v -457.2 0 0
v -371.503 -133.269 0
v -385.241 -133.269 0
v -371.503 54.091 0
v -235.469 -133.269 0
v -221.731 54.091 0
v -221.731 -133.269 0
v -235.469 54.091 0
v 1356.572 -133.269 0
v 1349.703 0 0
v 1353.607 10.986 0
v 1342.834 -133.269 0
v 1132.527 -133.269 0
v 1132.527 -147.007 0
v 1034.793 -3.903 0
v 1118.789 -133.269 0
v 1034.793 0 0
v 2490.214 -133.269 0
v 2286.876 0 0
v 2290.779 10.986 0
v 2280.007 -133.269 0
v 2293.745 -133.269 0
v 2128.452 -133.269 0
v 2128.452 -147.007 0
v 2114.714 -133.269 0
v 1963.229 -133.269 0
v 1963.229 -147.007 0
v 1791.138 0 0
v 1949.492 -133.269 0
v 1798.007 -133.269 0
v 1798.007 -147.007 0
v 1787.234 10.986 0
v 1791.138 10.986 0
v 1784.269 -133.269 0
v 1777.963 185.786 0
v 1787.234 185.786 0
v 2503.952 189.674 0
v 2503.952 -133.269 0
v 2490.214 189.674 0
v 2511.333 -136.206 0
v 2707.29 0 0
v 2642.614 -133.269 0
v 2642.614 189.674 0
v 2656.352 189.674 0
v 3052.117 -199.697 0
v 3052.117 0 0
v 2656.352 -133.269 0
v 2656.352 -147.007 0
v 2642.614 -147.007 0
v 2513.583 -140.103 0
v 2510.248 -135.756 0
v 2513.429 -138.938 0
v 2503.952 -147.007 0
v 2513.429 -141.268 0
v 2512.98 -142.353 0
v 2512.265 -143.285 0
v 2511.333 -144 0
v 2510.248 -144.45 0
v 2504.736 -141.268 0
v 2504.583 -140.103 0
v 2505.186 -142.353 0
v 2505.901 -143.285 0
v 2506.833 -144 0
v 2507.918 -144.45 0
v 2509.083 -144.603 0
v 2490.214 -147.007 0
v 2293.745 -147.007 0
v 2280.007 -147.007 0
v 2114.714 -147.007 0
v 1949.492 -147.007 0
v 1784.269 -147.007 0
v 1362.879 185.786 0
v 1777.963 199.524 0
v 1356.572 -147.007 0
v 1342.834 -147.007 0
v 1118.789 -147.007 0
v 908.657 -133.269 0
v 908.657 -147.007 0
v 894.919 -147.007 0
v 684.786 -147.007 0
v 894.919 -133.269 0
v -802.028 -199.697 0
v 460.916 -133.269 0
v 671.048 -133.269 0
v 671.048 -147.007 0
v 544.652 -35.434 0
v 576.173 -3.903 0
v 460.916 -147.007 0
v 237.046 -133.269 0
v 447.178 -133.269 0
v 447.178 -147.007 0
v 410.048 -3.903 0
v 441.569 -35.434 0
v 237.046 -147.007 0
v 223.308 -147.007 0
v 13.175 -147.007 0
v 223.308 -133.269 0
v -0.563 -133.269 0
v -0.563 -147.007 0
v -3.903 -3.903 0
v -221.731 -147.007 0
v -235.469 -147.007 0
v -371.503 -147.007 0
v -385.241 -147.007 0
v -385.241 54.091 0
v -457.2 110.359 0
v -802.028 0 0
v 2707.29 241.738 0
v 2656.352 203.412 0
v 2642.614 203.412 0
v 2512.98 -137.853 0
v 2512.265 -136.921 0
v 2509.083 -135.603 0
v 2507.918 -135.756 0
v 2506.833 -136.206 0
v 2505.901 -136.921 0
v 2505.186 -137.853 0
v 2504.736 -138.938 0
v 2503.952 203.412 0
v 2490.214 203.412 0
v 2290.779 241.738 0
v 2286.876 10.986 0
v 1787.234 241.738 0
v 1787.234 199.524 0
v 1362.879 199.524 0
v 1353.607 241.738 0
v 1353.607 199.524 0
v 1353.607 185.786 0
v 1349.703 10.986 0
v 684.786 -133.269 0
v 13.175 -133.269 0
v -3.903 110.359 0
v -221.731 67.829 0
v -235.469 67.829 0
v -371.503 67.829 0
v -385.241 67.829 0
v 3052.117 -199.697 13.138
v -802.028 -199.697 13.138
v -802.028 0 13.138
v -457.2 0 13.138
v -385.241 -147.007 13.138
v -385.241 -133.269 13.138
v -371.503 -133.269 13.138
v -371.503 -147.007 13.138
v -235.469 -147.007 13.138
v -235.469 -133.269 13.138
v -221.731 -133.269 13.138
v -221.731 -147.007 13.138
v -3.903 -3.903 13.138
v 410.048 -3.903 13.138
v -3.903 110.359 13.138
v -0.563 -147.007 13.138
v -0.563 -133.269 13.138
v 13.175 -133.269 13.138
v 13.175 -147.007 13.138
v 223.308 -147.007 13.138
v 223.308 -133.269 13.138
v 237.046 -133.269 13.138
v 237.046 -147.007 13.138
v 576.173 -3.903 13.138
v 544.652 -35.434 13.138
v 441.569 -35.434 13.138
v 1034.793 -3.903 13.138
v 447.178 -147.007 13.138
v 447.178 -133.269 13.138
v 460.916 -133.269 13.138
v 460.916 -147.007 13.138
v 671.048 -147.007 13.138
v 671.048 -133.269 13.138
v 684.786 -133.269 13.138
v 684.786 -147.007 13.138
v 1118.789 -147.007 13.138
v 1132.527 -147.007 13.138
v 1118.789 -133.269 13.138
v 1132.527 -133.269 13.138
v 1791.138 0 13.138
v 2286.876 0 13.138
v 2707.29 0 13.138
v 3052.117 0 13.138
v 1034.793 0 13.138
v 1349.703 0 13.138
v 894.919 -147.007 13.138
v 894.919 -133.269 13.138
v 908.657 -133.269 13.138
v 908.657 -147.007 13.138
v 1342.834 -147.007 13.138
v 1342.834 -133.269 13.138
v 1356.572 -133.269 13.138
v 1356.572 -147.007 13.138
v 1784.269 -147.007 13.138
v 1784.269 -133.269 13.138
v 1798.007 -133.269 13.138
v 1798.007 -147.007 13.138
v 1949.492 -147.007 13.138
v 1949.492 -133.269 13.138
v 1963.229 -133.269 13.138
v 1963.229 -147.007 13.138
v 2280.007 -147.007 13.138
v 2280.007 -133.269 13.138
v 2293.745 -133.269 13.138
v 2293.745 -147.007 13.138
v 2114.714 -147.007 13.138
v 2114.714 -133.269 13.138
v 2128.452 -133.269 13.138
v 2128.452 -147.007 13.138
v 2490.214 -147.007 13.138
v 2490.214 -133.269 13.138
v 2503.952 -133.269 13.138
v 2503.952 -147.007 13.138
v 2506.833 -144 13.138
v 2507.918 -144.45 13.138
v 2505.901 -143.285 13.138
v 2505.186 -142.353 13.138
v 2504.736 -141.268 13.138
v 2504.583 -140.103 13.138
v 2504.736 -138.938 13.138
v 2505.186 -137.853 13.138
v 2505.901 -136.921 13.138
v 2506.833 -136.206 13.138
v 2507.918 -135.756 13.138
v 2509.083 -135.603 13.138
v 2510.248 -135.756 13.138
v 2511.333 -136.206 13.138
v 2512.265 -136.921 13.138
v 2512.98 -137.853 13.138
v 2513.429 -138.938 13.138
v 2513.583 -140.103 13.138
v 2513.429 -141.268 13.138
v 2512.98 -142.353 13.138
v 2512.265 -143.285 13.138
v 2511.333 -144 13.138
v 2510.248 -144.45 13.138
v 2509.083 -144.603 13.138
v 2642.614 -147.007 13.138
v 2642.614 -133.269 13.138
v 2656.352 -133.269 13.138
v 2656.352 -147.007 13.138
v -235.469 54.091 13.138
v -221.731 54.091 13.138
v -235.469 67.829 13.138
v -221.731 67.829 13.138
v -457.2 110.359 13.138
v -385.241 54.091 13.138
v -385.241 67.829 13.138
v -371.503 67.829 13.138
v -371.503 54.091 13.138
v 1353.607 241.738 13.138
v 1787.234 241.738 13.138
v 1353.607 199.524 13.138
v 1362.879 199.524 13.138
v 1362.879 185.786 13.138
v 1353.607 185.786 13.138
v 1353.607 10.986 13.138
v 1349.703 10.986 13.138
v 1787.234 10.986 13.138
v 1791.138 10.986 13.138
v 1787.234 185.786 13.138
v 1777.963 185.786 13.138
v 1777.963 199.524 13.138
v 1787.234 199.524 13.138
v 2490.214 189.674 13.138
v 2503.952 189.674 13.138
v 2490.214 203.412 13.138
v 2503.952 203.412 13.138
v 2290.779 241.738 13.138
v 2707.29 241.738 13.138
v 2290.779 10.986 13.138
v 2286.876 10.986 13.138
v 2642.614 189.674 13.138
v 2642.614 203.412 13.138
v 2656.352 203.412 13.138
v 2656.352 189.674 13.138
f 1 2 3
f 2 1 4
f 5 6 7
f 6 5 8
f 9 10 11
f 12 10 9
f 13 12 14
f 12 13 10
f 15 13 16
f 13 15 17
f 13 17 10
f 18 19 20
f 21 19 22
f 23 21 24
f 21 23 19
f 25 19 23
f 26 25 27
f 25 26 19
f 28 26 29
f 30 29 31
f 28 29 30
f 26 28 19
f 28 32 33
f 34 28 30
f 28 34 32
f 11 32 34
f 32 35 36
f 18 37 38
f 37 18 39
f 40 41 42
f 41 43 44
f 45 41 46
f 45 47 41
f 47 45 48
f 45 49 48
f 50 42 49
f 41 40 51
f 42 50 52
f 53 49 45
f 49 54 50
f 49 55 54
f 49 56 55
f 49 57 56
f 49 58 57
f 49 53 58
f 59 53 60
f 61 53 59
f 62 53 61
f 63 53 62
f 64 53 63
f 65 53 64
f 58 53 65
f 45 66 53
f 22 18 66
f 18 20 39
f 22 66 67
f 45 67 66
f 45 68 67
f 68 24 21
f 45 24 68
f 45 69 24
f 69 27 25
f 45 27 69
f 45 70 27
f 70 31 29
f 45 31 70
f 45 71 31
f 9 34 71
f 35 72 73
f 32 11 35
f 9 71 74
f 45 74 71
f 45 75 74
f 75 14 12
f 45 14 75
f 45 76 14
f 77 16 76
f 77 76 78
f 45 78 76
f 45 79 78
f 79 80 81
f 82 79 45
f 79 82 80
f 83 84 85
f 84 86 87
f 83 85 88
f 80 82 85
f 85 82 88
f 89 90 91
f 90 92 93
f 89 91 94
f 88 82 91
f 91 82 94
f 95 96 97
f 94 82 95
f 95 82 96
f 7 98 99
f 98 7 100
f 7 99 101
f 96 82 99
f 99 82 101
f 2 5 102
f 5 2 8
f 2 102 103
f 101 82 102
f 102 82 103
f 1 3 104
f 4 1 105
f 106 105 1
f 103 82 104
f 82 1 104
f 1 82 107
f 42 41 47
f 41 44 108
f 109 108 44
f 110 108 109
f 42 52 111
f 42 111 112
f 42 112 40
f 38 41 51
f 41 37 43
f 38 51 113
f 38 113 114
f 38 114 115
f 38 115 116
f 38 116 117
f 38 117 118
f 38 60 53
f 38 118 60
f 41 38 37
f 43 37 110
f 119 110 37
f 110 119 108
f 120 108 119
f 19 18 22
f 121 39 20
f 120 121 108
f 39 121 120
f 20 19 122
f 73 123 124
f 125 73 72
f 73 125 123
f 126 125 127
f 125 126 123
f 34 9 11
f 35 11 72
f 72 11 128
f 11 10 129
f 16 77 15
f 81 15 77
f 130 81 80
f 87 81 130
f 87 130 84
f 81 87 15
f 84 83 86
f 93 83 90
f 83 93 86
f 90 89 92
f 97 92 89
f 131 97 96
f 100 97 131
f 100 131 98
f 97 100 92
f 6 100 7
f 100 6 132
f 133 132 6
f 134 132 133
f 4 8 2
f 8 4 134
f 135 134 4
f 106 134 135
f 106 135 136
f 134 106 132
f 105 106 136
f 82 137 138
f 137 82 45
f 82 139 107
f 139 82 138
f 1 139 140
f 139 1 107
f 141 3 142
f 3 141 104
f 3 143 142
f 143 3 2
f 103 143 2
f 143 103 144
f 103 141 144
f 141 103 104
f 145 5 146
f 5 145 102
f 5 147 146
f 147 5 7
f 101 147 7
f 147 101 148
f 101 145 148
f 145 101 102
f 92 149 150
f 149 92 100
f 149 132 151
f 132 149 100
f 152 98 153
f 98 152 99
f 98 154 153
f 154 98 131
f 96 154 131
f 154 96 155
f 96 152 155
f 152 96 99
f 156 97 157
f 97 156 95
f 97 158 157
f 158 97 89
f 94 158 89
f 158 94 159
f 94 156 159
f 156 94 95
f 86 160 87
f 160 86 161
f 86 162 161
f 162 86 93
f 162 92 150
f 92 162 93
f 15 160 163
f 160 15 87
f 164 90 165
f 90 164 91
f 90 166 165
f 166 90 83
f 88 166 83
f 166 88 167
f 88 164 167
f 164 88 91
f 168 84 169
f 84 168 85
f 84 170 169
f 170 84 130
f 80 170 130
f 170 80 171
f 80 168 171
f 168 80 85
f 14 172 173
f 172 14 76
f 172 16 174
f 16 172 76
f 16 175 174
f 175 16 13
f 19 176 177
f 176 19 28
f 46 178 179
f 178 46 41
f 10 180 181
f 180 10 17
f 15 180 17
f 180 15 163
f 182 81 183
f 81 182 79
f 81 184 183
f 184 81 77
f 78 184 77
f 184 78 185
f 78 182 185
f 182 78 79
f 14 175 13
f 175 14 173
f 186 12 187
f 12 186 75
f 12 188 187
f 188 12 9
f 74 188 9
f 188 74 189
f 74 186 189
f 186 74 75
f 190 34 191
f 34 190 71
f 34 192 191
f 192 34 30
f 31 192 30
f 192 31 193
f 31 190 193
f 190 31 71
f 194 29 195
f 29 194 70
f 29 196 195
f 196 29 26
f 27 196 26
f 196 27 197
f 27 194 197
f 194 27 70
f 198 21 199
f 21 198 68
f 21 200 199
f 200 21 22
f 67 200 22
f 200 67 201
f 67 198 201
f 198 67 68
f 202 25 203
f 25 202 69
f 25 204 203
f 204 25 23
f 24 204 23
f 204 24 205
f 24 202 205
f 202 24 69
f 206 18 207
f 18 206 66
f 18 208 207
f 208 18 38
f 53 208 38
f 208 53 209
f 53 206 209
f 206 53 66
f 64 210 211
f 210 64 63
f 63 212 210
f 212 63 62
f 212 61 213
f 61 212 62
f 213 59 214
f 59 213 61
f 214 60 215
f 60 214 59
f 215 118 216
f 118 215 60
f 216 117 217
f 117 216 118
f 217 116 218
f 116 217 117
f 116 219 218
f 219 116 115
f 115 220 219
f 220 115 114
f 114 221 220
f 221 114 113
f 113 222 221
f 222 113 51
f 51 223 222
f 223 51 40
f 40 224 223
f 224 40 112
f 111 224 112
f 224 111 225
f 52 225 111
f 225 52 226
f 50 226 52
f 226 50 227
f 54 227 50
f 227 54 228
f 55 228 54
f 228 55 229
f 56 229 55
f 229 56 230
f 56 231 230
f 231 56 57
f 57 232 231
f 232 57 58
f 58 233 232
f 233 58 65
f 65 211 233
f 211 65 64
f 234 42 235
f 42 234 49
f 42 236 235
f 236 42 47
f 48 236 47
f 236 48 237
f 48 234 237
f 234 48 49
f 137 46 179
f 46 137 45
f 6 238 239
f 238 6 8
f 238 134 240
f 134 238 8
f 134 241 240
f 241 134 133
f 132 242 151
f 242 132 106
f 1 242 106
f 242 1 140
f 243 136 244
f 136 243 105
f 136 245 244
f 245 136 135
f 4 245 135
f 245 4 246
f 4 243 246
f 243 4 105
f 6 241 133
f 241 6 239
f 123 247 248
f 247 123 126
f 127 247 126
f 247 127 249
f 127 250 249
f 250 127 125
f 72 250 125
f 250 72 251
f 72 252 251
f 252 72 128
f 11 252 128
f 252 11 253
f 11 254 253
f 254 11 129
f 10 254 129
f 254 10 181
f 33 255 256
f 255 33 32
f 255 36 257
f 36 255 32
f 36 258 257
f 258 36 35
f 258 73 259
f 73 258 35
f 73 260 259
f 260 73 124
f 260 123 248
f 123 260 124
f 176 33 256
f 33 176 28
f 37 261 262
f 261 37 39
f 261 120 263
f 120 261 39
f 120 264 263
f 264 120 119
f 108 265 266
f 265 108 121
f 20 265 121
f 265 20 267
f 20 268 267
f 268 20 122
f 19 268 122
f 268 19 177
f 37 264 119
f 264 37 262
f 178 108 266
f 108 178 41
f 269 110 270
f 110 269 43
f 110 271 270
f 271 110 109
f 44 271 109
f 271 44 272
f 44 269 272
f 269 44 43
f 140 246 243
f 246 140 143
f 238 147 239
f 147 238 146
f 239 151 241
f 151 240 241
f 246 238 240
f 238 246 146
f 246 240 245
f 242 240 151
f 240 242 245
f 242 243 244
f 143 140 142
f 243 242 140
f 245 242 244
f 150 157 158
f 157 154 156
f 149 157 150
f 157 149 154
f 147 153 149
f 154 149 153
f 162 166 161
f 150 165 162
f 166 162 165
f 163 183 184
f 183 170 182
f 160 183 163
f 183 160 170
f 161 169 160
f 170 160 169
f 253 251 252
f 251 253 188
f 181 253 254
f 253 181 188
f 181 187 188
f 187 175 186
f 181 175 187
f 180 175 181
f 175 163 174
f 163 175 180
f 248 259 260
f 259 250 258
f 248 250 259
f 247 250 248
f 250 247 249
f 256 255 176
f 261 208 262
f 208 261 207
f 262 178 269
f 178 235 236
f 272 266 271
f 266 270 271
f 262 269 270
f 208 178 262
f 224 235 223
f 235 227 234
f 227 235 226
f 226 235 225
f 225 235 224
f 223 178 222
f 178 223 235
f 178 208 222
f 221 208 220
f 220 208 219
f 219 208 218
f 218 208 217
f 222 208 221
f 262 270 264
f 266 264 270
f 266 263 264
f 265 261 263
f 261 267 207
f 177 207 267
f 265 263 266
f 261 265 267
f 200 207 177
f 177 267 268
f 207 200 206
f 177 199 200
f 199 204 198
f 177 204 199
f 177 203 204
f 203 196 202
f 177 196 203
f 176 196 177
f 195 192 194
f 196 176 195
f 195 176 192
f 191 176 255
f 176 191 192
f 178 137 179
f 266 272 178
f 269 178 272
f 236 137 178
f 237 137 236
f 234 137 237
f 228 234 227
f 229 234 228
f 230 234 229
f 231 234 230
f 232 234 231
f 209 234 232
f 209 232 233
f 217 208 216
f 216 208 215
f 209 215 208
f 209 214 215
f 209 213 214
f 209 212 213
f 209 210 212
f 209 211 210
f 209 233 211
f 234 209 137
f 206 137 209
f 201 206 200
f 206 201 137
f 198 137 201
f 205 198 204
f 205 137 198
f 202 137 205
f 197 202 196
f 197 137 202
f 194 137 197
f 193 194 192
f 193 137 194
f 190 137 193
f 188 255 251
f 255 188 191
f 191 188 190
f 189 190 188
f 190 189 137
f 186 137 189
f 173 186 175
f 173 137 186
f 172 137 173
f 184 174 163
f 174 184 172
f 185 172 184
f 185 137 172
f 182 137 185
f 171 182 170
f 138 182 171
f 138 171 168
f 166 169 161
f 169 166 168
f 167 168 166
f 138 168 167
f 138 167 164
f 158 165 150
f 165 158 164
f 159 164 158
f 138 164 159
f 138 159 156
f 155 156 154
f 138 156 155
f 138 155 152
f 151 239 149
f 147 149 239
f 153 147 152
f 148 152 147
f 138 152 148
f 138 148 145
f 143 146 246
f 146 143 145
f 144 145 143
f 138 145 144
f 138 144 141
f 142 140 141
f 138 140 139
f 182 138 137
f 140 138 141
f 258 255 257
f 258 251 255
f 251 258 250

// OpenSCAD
// file: ../janesville_common.scad
// =====================================================================
//  CMSP Janesville WI Station - shared settings and footprint
//  Frost & Granger, 1902 as-built prints.  G scale 1:29.  Units: model mm.
//  Every other .scad file in this project does:  include <../janesville_common.scad>
// =====================================================================

// ---------- scale ----------
SCALE = 29;
function ft(f, i = 0) = (f * 12 + i) * 25.4 / SCALE;   // real feet + inches -> model mm

// ---------- printer ----------
// "P1S"  = Bambu Lab P1S, 256 x 256 x 256 bed  (use 252 usable)
// "GIGA" = Tom's large-format printer, 800 x 800 x 1000 (use 780 usable)
PRINTER = "P1S";
function bed_for(p) = p == "GIGA" ? [780, 780, 980] : [252, 252, 250];
BED = bed_for(PRINTER);

// ---------- colors (preview only; print color = filament) ----------
PULLMAN_GREEN = "#3B4A2C";   // windows, doors, trim
BRICK_RED     = "#8E3B2C";
MORTAR_WHITE  = "#F2EFE6";
STONE_BUFF    = "#C9B79C";

// ---------- joints between printed sections ----------
PIN_D      = 3.0;    // alignment pin (3 mm PETG filament stub or steel pin)
PIN_CLEAR  = 0.25;   // hole oversize
PIN_DEPTH  = 6;      // hole depth each side of a cut
CUT_BAND   = 5;      // solid band each side of a cut so pins land in plastic

// ---------- NeoPixel wiring ----------
WIRE_CHANNEL = [10, 6];   // width x height of notches in under-floor ribs (3-wire bus)
FEED_HOLE_D  = 8;         // hole up through the floor into each room

// ---------- coordinates ----------
// x runs west -> east along the track.  x = 0 at the west end wall line.
// y = 0 at the main track-side wall line, +y toward town.
// Dimensions are to the MAIN WALL LINE (as the drawings are figured).

// Main building, B2077 / B2076.  Overall 128'-5".
X_WEST_END   = 0;
X_PAV_W      = ft(38, 9);                 // general waiting room wing  38'-9"
X_PAV_E      = X_PAV_W + ft(22, 6);       // center pavilion            22'-6"
X_SMOKE_E    = X_PAV_E + ft(36, 10);      // smoking room wing          36'-10"
X_MAIN_E     = X_SMOKE_E + ft(30, 4);     // lunch room wing            30'-4"  -> 128'-5"
MAIN_DEPTH   = ft(32, 0);                 // west wing, pavilion, smoking wing

// Lunch-room wing is narrower: 25'-4" deep (7'-2" + 11'-0" + 7'-2"),
// set back 1'-5" on the track side and 5'-3" on the town side.  VERIFY vs B2078/B2079.
LUNCH_Y0     = ft(1, 5);
LUNCH_Y1     = LUNCH_Y0 + ft(25, 4);

// Pavilion projections.  APPROXIMATE - verify against elevations.
PORCH_PROJ   = ft(3, 6);    // town side: two 6'-9" blocks project 3'-6"
PORCH_W      = ft(9, 0);    // recessed porch between them (open to y = MAIN_DEPTH)
BAY_PROJ     = ft(3, 0);    // track side: canted ticket-office bay
BAY_W_WALL   = ft(15, 6);   // bay width at the wall
BAY_W_FRONT  = ft(9, 6);    // bay width at its face
BAY_CX       = ft(46, 11);  // bay center from west end (B2077 track-side chain), not centered on the pavilion

// Baggage & express building, B2077: 47'-2" x 25'-4", 42'-0" east of the main building.
// Track wall assumed in line with the lunch wing.  VERIFY.
X_BAG_W      = X_MAIN_E + ft(42, 0);
X_BAG_E      = X_BAG_W + ft(47, 2);
BAG_Y0       = LUNCH_Y0;
BAG_Y1       = BAG_Y0 + ft(25, 4);

// Wall thicknesses (model mm)
T_MAIN  = 6.0;     // main block exterior walls (real 1'-5" = 14.9 mm, thinned for printing)
T_LIGHT = 5.0;     // lunch wing, porch, bay, baggage building

// Heights (B2082 / B2078)
FLOOR_Z      = ft(1, 9);    // finished floor above finished grade
WALL_H       = ft(19, 0);   // floor to cornice, town side
SILL_H       = ft(2, 9);    // floor to top of window sill
BASE_PROJ    = ft(0, 4);    // stone base / water table projects past the wall line

// ---------- footprints (2D) ----------
module footprint_main() {
    union() {
        translate([X_WEST_END, 0]) square([X_SMOKE_E - X_WEST_END, MAIN_DEPTH]);
        translate([X_SMOKE_E, LUNCH_Y0]) square([X_MAIN_E - X_SMOKE_E, LUNCH_Y1 - LUNCH_Y0]);
        // town-side pavilion blocks with the recessed porch between them
        difference() {
            translate([X_PAV_W, MAIN_DEPTH - 0.01]) square([X_PAV_E - X_PAV_W, PORCH_PROJ]);
            translate([(X_PAV_W + X_PAV_E - PORCH_W) / 2, MAIN_DEPTH - 1]) square([PORCH_W, PORCH_PROJ + 2]);
        }
        // track-side canted bay
        let(cx = BAY_CX)
        polygon([[cx - BAY_W_WALL / 2, 0.01], [cx + BAY_W_WALL / 2, 0.01],
                 [cx + BAY_W_FRONT / 2, -BAY_PROJ], [cx - BAY_W_FRONT / 2, -BAY_PROJ]]);
    }
}

module footprint_baggage() {
    translate([X_BAG_W, BAG_Y0]) square([X_BAG_E - X_BAG_W, BAG_Y1 - BAG_Y0]);
}
// main file
// =====================================================================
//  Brick platform  -  under the whole canopy, out to the track, and 10 m (32.8 ft)
//  beyond each end of the canopy.  Top = 6" below the floor (canopy eave is 12'-0" above it).
//  Brick pavers 8" x 4" in running bond.  Two bodies for the AMS (load together):
//    Platform          brick red            Platform_mortar   white joints (top 0.4 mm only)
//  Square holes let the canopy column footings pass through and locate the columns.
//  Printed flat, brick up.  Sections butt together; they sit on the layout.
// =====================================================================
include <../janesville_common.scad>
use <../Canopy/canopy.scad>

EXT = 10 / 0.3048;                     // 10 m in feet
CE = canopy_x_ends();
PX0 = CE[0] - EXT; PX1 = CE[1] + EXT;  // platform ends (ft)
PY_TRACK = -19;                        // platform edge at the track (ft)
P_TOP = FLOOR_Z + ft(-0.5);            // platform top above grade (mm)
JOINT = 0.4;                           // mortar joint depth (mm)
BRK = [ft(0, 8), ft(0, 4)]; MJ = 0.55; // paver size, joint width (mm)
PL_BX0 = 98 + 1/12 + 30 + 4/12 + 42; PL_BX1 = PL_BX0 + 47 + 2/12; PL_LX1 = 98 + 1/12 + 30 + 4/12;
// regions (ft): the long strip at the track + the three areas behind it
REGIONS = [[PX0, PY_TRACK, PX1, 0], [CE[0], 0, 0, 10.5], [PL_LX1, 0, PL_BX0, 23], [PL_BX1, 0, CE[1], 23]];
PART = "Platform"; TILE = -1; LAYER = -1; LIST = false;

function platform_x() = [PX0, PX1];
function ptiles(bed) = [for (r = REGIONS) let(n = ceil(ft(r[2] - r[0]) / (bed[0] - 10)), w = (r[2] - r[0]) / n)
    for (i = [0 : n - 1]) [r[0] + i * w, r[1], r[0] + (i + 1) * w, r[3]]];
function platform_count(bed) = len(ptiles(bed));
function platform_parts(bed) = [["Platform", platform_count(bed)], ["Platform_mortar", platform_count(bed)]];

module plat2d() difference() {
    for (r = REGIONS) translate([ft(r[0]), ft(r[1])]) square([ft(r[2] - r[0]), ft(r[3] - r[1])]);
    offset(delta = BASE_PROJ + 0.4) { footprint_main(); footprint_baggage(); }
    for (p = canopy_post_xy()) translate([ft(p[0]), ft(p[1])]) square(ft(1.25) + 0.6, center = true);
    translate([ft(PL_BX1 + 20) + 12, ft(-13.33)]) circle(d = 9, $fn = 24);      // wire slot beside the east-shelter column: canopy lighting riser
}
module tile2d(t) intersection() { plat2d(); translate([ft(t[0]), ft(t[1])]) square([ft(t[2] - t[0]), ft(t[3] - t[1])]); }
module grooves(t) {
    x0 = ft(t[0]); x1 = ft(t[2]); y0 = ft(t[1]); y1 = ft(t[3]); px = BRK[0]; py = BRK[1];
    for (j = [floor(y0 / py) : ceil(y1 / py)]) {
        translate([x0 - 1, j * py - MJ / 2]) square([x1 - x0 + 2, MJ]);
        for (i = [floor(x0 / px) - 1 : ceil(x1 / px)]) translate([(i + (j % 2 == 0 ? 0 : 0.5)) * px - MJ / 2, j * py]) square([MJ, py]);
    }
}
module platform_layer(tile, k, bed = BED) {
    T = ptiles(bed);
    for (i = [0 : len(T) - 1]) if (tile < 0 || tile == i) translate(tile < 0 ? [0, 0, 0] : [-ft(T[i][0]), -ft(T[i][1]), 0]) {
        if (k == 0) linear_extrude(P_TOP - JOINT) tile2d(T[i]);
        if (k == 1) translate([0, 0, P_TOP - JOINT]) linear_extrude(JOINT) difference() { tile2d(T[i]); if (tile >= 0) grooves(T[i]); }
        if (k == 2 && tile >= 0) translate([0, 0, P_TOP - JOINT]) linear_extrude(JOINT) intersection() { tile2d(T[i]); grooves(T[i]); }
    }
}
module platform_part(n, tile = -1, bed = BED) {
    if (n == "Platform") { platform_layer(tile, 0, bed); platform_layer(tile, 1, bed); }
    if (n == "Platform_mortar") platform_layer(tile, 2, bed);
}
module platform_place() color(BRICK_RED) { platform_layer(-1, 0); platform_layer(-1, 1); }

if (LIST) for (p = platform_parts(BED)) echo(str("PPART|", p[0], "|", p[1]));
else if (LAYER >= 0) platform_layer(TILE, LAYER, BED);
else platform_part(PART, TILE, BED);
